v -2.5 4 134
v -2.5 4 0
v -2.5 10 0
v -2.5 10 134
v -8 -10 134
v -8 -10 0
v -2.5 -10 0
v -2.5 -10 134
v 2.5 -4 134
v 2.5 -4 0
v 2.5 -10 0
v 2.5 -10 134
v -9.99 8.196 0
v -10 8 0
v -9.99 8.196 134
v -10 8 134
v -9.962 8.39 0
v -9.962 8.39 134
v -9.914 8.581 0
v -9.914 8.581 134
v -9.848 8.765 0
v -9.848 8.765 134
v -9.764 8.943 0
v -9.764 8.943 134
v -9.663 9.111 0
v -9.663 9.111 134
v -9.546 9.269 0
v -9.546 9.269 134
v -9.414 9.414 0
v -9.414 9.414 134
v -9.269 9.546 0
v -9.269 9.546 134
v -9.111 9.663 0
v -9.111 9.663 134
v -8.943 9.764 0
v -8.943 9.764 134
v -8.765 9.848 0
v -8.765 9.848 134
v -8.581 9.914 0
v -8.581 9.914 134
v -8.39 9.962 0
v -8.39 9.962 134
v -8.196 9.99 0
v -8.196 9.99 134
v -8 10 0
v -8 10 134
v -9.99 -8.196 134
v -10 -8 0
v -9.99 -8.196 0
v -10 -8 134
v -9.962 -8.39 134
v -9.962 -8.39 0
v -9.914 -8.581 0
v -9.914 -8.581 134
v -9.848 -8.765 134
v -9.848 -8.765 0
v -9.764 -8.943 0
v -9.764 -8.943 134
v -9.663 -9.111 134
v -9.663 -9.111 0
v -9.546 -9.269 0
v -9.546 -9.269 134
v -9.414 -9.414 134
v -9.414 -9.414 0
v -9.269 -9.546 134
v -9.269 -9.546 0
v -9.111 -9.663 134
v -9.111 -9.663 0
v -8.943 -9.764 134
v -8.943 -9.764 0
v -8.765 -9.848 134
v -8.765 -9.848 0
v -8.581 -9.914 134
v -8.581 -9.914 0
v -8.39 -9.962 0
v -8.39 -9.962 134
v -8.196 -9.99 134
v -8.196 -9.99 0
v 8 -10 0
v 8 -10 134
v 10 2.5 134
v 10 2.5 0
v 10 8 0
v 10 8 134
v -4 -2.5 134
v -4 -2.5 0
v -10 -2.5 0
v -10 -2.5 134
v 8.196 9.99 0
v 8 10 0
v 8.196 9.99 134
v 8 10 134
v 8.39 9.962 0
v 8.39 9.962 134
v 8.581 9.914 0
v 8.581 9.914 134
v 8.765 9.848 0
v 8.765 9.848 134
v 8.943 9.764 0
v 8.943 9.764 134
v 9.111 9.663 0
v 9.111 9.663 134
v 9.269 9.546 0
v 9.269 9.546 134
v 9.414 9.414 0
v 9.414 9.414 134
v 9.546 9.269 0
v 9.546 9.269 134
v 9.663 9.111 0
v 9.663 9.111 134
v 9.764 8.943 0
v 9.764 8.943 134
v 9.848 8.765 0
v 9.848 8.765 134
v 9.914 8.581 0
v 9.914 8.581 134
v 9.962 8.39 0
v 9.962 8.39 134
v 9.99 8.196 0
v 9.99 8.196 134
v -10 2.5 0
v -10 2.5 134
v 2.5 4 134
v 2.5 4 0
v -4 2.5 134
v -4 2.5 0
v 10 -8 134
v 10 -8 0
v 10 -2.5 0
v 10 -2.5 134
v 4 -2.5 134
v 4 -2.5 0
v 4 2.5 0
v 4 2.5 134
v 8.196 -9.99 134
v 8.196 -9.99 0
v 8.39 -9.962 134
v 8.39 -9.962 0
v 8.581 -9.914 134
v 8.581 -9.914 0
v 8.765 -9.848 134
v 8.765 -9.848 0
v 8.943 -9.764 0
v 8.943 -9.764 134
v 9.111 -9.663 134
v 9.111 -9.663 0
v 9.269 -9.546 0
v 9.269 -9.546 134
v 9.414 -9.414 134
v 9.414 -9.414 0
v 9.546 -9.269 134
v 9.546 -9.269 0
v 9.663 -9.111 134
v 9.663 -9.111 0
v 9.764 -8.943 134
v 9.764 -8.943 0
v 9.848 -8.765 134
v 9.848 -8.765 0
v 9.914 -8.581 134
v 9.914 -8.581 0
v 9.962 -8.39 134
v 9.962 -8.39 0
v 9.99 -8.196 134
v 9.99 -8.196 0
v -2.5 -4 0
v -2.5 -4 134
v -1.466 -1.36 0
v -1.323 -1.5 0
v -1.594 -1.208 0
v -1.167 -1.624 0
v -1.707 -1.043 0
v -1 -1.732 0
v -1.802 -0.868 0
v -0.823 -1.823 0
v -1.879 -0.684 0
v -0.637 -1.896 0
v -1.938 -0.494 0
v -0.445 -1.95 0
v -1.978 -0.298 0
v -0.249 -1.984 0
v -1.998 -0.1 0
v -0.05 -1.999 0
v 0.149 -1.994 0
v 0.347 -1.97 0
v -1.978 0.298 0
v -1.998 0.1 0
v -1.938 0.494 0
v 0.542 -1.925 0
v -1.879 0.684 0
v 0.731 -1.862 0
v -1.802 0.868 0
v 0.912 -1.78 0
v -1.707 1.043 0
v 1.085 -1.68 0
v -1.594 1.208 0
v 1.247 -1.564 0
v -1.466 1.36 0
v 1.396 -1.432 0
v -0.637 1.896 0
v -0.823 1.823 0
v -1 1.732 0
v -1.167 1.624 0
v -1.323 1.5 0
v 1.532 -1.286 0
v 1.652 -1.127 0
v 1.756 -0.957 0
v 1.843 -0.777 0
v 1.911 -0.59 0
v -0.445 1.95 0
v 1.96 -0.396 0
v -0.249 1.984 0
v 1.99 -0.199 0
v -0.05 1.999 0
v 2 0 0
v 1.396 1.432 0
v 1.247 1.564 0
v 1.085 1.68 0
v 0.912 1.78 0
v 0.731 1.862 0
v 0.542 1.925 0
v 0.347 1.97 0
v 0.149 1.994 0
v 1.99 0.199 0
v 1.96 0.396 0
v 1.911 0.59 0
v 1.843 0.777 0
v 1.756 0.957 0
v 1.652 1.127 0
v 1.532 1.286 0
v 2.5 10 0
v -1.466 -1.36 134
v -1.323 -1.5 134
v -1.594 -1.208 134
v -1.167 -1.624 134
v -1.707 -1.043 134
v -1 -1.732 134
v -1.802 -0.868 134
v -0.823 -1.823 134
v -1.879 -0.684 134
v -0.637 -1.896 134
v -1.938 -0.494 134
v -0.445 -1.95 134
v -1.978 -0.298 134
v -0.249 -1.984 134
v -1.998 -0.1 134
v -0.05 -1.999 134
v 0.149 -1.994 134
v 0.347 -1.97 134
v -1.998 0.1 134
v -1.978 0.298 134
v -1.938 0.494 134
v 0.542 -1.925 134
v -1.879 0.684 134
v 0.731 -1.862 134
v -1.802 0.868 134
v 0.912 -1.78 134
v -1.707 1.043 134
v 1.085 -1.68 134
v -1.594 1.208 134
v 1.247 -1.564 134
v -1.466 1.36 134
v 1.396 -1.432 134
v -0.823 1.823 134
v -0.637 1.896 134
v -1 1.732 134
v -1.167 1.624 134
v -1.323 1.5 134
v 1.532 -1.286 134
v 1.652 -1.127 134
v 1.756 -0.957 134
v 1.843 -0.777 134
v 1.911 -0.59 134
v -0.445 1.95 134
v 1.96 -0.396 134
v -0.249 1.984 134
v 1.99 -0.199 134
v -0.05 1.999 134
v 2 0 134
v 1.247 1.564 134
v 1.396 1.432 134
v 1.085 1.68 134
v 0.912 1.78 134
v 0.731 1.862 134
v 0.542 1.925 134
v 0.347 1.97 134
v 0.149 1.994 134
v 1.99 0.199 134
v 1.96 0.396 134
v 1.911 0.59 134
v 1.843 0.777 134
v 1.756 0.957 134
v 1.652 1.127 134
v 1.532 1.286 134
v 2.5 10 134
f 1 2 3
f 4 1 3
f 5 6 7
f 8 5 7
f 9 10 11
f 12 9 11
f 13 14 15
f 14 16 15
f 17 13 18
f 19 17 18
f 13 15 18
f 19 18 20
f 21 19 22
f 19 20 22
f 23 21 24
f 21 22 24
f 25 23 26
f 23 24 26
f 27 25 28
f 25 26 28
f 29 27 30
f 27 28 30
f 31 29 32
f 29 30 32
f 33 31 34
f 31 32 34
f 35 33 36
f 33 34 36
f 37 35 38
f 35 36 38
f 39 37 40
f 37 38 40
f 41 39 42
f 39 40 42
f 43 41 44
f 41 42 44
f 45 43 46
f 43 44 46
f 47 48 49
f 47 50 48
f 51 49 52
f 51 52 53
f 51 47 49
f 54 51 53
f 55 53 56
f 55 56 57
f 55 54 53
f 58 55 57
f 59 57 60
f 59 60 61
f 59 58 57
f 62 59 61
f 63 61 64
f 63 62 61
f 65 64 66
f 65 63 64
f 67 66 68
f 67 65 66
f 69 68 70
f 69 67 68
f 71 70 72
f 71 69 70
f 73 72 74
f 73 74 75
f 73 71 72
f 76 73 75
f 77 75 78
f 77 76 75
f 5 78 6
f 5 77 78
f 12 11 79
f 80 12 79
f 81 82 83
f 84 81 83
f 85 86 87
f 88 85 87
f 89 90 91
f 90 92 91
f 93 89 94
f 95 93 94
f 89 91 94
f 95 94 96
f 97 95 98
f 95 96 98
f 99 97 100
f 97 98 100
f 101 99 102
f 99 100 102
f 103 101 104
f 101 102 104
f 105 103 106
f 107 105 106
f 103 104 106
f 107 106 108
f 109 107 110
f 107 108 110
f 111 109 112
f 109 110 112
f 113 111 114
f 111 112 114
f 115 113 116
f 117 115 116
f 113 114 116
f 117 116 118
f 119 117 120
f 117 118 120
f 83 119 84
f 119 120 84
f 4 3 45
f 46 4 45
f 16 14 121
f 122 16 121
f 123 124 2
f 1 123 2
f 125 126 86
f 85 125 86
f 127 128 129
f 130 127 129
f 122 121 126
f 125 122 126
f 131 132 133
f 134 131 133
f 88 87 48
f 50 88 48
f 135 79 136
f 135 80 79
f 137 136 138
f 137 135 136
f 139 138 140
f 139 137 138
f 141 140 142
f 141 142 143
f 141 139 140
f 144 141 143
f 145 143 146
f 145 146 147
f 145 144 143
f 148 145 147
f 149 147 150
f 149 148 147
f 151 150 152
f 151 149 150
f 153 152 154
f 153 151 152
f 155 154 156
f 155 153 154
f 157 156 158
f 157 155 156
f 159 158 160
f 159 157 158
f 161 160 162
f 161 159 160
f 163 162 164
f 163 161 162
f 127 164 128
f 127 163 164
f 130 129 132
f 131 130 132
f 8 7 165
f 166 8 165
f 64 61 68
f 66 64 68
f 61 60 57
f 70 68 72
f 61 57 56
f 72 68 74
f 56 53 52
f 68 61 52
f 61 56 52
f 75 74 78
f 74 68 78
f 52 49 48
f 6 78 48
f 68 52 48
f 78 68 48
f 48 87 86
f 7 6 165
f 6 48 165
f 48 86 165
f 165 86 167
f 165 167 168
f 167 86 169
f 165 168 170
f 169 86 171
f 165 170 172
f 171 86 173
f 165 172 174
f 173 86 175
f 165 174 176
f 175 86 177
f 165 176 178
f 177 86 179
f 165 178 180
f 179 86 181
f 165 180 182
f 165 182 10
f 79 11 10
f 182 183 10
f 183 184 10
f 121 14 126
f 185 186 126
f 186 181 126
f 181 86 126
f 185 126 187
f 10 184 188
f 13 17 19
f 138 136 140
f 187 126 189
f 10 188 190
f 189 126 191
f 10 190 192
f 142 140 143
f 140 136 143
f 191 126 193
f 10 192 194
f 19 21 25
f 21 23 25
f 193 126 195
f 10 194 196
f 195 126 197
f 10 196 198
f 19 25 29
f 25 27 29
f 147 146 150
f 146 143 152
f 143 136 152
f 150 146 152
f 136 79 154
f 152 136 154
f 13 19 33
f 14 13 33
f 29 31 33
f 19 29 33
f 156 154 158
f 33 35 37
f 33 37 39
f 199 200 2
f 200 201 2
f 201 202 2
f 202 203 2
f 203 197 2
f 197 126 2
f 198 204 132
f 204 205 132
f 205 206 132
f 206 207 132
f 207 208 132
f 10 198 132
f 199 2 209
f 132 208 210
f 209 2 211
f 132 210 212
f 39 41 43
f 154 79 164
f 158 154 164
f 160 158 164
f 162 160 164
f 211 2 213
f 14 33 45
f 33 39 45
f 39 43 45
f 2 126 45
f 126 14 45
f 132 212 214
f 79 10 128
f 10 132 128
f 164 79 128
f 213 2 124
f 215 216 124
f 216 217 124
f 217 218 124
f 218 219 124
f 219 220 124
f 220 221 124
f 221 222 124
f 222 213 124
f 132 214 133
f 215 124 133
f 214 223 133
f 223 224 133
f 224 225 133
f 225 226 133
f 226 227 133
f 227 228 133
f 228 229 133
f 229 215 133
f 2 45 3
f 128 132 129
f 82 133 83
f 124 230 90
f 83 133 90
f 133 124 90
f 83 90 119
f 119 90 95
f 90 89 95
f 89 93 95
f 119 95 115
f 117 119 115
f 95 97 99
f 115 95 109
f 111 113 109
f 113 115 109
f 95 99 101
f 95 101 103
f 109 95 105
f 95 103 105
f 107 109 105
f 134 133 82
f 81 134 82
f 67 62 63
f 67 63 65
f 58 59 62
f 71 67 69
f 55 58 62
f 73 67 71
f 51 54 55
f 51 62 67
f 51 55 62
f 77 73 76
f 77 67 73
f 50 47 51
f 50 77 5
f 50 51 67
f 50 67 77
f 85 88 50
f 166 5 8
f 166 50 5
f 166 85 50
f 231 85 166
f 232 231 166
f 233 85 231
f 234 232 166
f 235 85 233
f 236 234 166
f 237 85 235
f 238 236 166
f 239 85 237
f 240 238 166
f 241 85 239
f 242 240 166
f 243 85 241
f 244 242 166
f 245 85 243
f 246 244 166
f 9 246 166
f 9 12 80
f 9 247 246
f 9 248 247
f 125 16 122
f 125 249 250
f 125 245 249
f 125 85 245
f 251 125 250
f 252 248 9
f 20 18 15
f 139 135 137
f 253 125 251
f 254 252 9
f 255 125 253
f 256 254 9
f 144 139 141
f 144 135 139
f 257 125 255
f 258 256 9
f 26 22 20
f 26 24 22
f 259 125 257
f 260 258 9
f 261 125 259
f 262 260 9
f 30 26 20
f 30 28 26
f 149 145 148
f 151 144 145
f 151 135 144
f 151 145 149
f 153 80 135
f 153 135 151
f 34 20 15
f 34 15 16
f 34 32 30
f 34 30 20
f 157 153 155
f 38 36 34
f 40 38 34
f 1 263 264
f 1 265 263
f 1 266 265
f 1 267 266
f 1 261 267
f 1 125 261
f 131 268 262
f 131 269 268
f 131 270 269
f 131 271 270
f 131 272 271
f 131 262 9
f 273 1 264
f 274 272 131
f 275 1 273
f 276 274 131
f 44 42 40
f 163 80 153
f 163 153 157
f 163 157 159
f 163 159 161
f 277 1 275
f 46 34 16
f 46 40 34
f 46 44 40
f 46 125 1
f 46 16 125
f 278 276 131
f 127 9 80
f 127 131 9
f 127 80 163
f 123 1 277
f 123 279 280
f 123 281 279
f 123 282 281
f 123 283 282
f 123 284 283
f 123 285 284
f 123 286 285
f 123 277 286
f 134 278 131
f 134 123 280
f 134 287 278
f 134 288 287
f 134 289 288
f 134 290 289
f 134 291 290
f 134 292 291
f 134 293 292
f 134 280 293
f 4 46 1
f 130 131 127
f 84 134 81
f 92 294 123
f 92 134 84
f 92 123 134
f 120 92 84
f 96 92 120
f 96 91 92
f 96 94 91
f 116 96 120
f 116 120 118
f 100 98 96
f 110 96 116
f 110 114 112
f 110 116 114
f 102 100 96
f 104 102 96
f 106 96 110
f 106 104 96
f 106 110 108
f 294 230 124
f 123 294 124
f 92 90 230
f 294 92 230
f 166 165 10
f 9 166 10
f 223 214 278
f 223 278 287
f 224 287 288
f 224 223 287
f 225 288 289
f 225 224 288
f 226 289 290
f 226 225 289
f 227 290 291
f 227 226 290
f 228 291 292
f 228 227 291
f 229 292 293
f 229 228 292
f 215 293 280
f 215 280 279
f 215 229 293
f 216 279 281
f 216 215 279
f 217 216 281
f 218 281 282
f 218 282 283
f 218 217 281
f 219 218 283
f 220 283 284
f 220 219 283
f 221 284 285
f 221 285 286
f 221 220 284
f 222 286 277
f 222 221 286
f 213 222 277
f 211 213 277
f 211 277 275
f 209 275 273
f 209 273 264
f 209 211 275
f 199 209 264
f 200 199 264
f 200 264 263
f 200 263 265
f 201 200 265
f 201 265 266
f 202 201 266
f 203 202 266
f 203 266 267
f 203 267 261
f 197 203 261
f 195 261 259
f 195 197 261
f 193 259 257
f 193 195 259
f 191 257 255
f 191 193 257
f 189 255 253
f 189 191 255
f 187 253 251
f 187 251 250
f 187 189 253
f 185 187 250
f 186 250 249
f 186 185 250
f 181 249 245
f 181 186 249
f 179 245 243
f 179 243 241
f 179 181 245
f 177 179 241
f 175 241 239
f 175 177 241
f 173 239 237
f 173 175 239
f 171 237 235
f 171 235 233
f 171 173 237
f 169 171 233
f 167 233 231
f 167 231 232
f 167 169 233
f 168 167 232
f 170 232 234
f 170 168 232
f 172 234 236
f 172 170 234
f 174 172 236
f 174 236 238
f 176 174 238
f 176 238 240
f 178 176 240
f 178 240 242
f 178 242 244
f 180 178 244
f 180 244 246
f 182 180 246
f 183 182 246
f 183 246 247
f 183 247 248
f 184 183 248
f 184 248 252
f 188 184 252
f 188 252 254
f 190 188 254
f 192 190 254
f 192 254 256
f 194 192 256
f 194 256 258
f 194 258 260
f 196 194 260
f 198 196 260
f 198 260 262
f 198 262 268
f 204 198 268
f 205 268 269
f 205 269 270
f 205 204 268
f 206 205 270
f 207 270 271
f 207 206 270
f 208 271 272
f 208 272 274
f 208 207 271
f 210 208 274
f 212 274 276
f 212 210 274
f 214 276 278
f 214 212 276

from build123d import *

# Parameters (mm, degrees)
F0_R     = 2
F1_DEPTH = 134
F2_R     = 2


with BuildPart() as f1:
    # F0 (on Top) → F1 (new body)
    with BuildSketch(Plane.XY):
        Polygon((-4, 2.5), (-4, 0), (-4, -2.5), (-10, -2.5), (-10, -10), (-2.5, -10), (-2.5, -4), (0, -4), (2.5, -4), (2.5, -10), (10, -10), (10, -2.5), (4, -2.5), (4, 0), (4, 2.5), (10, 2.5), (10, 10), (2.5, 10), (2.5, 4), (0, 4), (-2.5, 4), (-2.5, 10), (-10, 10), (-10, 2.5), align=None)
        Circle(F0_R, mode=Mode.SUBTRACT)
    extrude(amount=F1_DEPTH)

    # F2
    f2_edges = [f1.edges().sort_by_distance(p)[0] for p in [
        (10, -10, 67),
        (-10, -10, 67),
        (-10, 10, 67),
        (10, 10, 67),
    ]]
    fillet(f2_edges, radius=F2_R)


solid = f1.part
